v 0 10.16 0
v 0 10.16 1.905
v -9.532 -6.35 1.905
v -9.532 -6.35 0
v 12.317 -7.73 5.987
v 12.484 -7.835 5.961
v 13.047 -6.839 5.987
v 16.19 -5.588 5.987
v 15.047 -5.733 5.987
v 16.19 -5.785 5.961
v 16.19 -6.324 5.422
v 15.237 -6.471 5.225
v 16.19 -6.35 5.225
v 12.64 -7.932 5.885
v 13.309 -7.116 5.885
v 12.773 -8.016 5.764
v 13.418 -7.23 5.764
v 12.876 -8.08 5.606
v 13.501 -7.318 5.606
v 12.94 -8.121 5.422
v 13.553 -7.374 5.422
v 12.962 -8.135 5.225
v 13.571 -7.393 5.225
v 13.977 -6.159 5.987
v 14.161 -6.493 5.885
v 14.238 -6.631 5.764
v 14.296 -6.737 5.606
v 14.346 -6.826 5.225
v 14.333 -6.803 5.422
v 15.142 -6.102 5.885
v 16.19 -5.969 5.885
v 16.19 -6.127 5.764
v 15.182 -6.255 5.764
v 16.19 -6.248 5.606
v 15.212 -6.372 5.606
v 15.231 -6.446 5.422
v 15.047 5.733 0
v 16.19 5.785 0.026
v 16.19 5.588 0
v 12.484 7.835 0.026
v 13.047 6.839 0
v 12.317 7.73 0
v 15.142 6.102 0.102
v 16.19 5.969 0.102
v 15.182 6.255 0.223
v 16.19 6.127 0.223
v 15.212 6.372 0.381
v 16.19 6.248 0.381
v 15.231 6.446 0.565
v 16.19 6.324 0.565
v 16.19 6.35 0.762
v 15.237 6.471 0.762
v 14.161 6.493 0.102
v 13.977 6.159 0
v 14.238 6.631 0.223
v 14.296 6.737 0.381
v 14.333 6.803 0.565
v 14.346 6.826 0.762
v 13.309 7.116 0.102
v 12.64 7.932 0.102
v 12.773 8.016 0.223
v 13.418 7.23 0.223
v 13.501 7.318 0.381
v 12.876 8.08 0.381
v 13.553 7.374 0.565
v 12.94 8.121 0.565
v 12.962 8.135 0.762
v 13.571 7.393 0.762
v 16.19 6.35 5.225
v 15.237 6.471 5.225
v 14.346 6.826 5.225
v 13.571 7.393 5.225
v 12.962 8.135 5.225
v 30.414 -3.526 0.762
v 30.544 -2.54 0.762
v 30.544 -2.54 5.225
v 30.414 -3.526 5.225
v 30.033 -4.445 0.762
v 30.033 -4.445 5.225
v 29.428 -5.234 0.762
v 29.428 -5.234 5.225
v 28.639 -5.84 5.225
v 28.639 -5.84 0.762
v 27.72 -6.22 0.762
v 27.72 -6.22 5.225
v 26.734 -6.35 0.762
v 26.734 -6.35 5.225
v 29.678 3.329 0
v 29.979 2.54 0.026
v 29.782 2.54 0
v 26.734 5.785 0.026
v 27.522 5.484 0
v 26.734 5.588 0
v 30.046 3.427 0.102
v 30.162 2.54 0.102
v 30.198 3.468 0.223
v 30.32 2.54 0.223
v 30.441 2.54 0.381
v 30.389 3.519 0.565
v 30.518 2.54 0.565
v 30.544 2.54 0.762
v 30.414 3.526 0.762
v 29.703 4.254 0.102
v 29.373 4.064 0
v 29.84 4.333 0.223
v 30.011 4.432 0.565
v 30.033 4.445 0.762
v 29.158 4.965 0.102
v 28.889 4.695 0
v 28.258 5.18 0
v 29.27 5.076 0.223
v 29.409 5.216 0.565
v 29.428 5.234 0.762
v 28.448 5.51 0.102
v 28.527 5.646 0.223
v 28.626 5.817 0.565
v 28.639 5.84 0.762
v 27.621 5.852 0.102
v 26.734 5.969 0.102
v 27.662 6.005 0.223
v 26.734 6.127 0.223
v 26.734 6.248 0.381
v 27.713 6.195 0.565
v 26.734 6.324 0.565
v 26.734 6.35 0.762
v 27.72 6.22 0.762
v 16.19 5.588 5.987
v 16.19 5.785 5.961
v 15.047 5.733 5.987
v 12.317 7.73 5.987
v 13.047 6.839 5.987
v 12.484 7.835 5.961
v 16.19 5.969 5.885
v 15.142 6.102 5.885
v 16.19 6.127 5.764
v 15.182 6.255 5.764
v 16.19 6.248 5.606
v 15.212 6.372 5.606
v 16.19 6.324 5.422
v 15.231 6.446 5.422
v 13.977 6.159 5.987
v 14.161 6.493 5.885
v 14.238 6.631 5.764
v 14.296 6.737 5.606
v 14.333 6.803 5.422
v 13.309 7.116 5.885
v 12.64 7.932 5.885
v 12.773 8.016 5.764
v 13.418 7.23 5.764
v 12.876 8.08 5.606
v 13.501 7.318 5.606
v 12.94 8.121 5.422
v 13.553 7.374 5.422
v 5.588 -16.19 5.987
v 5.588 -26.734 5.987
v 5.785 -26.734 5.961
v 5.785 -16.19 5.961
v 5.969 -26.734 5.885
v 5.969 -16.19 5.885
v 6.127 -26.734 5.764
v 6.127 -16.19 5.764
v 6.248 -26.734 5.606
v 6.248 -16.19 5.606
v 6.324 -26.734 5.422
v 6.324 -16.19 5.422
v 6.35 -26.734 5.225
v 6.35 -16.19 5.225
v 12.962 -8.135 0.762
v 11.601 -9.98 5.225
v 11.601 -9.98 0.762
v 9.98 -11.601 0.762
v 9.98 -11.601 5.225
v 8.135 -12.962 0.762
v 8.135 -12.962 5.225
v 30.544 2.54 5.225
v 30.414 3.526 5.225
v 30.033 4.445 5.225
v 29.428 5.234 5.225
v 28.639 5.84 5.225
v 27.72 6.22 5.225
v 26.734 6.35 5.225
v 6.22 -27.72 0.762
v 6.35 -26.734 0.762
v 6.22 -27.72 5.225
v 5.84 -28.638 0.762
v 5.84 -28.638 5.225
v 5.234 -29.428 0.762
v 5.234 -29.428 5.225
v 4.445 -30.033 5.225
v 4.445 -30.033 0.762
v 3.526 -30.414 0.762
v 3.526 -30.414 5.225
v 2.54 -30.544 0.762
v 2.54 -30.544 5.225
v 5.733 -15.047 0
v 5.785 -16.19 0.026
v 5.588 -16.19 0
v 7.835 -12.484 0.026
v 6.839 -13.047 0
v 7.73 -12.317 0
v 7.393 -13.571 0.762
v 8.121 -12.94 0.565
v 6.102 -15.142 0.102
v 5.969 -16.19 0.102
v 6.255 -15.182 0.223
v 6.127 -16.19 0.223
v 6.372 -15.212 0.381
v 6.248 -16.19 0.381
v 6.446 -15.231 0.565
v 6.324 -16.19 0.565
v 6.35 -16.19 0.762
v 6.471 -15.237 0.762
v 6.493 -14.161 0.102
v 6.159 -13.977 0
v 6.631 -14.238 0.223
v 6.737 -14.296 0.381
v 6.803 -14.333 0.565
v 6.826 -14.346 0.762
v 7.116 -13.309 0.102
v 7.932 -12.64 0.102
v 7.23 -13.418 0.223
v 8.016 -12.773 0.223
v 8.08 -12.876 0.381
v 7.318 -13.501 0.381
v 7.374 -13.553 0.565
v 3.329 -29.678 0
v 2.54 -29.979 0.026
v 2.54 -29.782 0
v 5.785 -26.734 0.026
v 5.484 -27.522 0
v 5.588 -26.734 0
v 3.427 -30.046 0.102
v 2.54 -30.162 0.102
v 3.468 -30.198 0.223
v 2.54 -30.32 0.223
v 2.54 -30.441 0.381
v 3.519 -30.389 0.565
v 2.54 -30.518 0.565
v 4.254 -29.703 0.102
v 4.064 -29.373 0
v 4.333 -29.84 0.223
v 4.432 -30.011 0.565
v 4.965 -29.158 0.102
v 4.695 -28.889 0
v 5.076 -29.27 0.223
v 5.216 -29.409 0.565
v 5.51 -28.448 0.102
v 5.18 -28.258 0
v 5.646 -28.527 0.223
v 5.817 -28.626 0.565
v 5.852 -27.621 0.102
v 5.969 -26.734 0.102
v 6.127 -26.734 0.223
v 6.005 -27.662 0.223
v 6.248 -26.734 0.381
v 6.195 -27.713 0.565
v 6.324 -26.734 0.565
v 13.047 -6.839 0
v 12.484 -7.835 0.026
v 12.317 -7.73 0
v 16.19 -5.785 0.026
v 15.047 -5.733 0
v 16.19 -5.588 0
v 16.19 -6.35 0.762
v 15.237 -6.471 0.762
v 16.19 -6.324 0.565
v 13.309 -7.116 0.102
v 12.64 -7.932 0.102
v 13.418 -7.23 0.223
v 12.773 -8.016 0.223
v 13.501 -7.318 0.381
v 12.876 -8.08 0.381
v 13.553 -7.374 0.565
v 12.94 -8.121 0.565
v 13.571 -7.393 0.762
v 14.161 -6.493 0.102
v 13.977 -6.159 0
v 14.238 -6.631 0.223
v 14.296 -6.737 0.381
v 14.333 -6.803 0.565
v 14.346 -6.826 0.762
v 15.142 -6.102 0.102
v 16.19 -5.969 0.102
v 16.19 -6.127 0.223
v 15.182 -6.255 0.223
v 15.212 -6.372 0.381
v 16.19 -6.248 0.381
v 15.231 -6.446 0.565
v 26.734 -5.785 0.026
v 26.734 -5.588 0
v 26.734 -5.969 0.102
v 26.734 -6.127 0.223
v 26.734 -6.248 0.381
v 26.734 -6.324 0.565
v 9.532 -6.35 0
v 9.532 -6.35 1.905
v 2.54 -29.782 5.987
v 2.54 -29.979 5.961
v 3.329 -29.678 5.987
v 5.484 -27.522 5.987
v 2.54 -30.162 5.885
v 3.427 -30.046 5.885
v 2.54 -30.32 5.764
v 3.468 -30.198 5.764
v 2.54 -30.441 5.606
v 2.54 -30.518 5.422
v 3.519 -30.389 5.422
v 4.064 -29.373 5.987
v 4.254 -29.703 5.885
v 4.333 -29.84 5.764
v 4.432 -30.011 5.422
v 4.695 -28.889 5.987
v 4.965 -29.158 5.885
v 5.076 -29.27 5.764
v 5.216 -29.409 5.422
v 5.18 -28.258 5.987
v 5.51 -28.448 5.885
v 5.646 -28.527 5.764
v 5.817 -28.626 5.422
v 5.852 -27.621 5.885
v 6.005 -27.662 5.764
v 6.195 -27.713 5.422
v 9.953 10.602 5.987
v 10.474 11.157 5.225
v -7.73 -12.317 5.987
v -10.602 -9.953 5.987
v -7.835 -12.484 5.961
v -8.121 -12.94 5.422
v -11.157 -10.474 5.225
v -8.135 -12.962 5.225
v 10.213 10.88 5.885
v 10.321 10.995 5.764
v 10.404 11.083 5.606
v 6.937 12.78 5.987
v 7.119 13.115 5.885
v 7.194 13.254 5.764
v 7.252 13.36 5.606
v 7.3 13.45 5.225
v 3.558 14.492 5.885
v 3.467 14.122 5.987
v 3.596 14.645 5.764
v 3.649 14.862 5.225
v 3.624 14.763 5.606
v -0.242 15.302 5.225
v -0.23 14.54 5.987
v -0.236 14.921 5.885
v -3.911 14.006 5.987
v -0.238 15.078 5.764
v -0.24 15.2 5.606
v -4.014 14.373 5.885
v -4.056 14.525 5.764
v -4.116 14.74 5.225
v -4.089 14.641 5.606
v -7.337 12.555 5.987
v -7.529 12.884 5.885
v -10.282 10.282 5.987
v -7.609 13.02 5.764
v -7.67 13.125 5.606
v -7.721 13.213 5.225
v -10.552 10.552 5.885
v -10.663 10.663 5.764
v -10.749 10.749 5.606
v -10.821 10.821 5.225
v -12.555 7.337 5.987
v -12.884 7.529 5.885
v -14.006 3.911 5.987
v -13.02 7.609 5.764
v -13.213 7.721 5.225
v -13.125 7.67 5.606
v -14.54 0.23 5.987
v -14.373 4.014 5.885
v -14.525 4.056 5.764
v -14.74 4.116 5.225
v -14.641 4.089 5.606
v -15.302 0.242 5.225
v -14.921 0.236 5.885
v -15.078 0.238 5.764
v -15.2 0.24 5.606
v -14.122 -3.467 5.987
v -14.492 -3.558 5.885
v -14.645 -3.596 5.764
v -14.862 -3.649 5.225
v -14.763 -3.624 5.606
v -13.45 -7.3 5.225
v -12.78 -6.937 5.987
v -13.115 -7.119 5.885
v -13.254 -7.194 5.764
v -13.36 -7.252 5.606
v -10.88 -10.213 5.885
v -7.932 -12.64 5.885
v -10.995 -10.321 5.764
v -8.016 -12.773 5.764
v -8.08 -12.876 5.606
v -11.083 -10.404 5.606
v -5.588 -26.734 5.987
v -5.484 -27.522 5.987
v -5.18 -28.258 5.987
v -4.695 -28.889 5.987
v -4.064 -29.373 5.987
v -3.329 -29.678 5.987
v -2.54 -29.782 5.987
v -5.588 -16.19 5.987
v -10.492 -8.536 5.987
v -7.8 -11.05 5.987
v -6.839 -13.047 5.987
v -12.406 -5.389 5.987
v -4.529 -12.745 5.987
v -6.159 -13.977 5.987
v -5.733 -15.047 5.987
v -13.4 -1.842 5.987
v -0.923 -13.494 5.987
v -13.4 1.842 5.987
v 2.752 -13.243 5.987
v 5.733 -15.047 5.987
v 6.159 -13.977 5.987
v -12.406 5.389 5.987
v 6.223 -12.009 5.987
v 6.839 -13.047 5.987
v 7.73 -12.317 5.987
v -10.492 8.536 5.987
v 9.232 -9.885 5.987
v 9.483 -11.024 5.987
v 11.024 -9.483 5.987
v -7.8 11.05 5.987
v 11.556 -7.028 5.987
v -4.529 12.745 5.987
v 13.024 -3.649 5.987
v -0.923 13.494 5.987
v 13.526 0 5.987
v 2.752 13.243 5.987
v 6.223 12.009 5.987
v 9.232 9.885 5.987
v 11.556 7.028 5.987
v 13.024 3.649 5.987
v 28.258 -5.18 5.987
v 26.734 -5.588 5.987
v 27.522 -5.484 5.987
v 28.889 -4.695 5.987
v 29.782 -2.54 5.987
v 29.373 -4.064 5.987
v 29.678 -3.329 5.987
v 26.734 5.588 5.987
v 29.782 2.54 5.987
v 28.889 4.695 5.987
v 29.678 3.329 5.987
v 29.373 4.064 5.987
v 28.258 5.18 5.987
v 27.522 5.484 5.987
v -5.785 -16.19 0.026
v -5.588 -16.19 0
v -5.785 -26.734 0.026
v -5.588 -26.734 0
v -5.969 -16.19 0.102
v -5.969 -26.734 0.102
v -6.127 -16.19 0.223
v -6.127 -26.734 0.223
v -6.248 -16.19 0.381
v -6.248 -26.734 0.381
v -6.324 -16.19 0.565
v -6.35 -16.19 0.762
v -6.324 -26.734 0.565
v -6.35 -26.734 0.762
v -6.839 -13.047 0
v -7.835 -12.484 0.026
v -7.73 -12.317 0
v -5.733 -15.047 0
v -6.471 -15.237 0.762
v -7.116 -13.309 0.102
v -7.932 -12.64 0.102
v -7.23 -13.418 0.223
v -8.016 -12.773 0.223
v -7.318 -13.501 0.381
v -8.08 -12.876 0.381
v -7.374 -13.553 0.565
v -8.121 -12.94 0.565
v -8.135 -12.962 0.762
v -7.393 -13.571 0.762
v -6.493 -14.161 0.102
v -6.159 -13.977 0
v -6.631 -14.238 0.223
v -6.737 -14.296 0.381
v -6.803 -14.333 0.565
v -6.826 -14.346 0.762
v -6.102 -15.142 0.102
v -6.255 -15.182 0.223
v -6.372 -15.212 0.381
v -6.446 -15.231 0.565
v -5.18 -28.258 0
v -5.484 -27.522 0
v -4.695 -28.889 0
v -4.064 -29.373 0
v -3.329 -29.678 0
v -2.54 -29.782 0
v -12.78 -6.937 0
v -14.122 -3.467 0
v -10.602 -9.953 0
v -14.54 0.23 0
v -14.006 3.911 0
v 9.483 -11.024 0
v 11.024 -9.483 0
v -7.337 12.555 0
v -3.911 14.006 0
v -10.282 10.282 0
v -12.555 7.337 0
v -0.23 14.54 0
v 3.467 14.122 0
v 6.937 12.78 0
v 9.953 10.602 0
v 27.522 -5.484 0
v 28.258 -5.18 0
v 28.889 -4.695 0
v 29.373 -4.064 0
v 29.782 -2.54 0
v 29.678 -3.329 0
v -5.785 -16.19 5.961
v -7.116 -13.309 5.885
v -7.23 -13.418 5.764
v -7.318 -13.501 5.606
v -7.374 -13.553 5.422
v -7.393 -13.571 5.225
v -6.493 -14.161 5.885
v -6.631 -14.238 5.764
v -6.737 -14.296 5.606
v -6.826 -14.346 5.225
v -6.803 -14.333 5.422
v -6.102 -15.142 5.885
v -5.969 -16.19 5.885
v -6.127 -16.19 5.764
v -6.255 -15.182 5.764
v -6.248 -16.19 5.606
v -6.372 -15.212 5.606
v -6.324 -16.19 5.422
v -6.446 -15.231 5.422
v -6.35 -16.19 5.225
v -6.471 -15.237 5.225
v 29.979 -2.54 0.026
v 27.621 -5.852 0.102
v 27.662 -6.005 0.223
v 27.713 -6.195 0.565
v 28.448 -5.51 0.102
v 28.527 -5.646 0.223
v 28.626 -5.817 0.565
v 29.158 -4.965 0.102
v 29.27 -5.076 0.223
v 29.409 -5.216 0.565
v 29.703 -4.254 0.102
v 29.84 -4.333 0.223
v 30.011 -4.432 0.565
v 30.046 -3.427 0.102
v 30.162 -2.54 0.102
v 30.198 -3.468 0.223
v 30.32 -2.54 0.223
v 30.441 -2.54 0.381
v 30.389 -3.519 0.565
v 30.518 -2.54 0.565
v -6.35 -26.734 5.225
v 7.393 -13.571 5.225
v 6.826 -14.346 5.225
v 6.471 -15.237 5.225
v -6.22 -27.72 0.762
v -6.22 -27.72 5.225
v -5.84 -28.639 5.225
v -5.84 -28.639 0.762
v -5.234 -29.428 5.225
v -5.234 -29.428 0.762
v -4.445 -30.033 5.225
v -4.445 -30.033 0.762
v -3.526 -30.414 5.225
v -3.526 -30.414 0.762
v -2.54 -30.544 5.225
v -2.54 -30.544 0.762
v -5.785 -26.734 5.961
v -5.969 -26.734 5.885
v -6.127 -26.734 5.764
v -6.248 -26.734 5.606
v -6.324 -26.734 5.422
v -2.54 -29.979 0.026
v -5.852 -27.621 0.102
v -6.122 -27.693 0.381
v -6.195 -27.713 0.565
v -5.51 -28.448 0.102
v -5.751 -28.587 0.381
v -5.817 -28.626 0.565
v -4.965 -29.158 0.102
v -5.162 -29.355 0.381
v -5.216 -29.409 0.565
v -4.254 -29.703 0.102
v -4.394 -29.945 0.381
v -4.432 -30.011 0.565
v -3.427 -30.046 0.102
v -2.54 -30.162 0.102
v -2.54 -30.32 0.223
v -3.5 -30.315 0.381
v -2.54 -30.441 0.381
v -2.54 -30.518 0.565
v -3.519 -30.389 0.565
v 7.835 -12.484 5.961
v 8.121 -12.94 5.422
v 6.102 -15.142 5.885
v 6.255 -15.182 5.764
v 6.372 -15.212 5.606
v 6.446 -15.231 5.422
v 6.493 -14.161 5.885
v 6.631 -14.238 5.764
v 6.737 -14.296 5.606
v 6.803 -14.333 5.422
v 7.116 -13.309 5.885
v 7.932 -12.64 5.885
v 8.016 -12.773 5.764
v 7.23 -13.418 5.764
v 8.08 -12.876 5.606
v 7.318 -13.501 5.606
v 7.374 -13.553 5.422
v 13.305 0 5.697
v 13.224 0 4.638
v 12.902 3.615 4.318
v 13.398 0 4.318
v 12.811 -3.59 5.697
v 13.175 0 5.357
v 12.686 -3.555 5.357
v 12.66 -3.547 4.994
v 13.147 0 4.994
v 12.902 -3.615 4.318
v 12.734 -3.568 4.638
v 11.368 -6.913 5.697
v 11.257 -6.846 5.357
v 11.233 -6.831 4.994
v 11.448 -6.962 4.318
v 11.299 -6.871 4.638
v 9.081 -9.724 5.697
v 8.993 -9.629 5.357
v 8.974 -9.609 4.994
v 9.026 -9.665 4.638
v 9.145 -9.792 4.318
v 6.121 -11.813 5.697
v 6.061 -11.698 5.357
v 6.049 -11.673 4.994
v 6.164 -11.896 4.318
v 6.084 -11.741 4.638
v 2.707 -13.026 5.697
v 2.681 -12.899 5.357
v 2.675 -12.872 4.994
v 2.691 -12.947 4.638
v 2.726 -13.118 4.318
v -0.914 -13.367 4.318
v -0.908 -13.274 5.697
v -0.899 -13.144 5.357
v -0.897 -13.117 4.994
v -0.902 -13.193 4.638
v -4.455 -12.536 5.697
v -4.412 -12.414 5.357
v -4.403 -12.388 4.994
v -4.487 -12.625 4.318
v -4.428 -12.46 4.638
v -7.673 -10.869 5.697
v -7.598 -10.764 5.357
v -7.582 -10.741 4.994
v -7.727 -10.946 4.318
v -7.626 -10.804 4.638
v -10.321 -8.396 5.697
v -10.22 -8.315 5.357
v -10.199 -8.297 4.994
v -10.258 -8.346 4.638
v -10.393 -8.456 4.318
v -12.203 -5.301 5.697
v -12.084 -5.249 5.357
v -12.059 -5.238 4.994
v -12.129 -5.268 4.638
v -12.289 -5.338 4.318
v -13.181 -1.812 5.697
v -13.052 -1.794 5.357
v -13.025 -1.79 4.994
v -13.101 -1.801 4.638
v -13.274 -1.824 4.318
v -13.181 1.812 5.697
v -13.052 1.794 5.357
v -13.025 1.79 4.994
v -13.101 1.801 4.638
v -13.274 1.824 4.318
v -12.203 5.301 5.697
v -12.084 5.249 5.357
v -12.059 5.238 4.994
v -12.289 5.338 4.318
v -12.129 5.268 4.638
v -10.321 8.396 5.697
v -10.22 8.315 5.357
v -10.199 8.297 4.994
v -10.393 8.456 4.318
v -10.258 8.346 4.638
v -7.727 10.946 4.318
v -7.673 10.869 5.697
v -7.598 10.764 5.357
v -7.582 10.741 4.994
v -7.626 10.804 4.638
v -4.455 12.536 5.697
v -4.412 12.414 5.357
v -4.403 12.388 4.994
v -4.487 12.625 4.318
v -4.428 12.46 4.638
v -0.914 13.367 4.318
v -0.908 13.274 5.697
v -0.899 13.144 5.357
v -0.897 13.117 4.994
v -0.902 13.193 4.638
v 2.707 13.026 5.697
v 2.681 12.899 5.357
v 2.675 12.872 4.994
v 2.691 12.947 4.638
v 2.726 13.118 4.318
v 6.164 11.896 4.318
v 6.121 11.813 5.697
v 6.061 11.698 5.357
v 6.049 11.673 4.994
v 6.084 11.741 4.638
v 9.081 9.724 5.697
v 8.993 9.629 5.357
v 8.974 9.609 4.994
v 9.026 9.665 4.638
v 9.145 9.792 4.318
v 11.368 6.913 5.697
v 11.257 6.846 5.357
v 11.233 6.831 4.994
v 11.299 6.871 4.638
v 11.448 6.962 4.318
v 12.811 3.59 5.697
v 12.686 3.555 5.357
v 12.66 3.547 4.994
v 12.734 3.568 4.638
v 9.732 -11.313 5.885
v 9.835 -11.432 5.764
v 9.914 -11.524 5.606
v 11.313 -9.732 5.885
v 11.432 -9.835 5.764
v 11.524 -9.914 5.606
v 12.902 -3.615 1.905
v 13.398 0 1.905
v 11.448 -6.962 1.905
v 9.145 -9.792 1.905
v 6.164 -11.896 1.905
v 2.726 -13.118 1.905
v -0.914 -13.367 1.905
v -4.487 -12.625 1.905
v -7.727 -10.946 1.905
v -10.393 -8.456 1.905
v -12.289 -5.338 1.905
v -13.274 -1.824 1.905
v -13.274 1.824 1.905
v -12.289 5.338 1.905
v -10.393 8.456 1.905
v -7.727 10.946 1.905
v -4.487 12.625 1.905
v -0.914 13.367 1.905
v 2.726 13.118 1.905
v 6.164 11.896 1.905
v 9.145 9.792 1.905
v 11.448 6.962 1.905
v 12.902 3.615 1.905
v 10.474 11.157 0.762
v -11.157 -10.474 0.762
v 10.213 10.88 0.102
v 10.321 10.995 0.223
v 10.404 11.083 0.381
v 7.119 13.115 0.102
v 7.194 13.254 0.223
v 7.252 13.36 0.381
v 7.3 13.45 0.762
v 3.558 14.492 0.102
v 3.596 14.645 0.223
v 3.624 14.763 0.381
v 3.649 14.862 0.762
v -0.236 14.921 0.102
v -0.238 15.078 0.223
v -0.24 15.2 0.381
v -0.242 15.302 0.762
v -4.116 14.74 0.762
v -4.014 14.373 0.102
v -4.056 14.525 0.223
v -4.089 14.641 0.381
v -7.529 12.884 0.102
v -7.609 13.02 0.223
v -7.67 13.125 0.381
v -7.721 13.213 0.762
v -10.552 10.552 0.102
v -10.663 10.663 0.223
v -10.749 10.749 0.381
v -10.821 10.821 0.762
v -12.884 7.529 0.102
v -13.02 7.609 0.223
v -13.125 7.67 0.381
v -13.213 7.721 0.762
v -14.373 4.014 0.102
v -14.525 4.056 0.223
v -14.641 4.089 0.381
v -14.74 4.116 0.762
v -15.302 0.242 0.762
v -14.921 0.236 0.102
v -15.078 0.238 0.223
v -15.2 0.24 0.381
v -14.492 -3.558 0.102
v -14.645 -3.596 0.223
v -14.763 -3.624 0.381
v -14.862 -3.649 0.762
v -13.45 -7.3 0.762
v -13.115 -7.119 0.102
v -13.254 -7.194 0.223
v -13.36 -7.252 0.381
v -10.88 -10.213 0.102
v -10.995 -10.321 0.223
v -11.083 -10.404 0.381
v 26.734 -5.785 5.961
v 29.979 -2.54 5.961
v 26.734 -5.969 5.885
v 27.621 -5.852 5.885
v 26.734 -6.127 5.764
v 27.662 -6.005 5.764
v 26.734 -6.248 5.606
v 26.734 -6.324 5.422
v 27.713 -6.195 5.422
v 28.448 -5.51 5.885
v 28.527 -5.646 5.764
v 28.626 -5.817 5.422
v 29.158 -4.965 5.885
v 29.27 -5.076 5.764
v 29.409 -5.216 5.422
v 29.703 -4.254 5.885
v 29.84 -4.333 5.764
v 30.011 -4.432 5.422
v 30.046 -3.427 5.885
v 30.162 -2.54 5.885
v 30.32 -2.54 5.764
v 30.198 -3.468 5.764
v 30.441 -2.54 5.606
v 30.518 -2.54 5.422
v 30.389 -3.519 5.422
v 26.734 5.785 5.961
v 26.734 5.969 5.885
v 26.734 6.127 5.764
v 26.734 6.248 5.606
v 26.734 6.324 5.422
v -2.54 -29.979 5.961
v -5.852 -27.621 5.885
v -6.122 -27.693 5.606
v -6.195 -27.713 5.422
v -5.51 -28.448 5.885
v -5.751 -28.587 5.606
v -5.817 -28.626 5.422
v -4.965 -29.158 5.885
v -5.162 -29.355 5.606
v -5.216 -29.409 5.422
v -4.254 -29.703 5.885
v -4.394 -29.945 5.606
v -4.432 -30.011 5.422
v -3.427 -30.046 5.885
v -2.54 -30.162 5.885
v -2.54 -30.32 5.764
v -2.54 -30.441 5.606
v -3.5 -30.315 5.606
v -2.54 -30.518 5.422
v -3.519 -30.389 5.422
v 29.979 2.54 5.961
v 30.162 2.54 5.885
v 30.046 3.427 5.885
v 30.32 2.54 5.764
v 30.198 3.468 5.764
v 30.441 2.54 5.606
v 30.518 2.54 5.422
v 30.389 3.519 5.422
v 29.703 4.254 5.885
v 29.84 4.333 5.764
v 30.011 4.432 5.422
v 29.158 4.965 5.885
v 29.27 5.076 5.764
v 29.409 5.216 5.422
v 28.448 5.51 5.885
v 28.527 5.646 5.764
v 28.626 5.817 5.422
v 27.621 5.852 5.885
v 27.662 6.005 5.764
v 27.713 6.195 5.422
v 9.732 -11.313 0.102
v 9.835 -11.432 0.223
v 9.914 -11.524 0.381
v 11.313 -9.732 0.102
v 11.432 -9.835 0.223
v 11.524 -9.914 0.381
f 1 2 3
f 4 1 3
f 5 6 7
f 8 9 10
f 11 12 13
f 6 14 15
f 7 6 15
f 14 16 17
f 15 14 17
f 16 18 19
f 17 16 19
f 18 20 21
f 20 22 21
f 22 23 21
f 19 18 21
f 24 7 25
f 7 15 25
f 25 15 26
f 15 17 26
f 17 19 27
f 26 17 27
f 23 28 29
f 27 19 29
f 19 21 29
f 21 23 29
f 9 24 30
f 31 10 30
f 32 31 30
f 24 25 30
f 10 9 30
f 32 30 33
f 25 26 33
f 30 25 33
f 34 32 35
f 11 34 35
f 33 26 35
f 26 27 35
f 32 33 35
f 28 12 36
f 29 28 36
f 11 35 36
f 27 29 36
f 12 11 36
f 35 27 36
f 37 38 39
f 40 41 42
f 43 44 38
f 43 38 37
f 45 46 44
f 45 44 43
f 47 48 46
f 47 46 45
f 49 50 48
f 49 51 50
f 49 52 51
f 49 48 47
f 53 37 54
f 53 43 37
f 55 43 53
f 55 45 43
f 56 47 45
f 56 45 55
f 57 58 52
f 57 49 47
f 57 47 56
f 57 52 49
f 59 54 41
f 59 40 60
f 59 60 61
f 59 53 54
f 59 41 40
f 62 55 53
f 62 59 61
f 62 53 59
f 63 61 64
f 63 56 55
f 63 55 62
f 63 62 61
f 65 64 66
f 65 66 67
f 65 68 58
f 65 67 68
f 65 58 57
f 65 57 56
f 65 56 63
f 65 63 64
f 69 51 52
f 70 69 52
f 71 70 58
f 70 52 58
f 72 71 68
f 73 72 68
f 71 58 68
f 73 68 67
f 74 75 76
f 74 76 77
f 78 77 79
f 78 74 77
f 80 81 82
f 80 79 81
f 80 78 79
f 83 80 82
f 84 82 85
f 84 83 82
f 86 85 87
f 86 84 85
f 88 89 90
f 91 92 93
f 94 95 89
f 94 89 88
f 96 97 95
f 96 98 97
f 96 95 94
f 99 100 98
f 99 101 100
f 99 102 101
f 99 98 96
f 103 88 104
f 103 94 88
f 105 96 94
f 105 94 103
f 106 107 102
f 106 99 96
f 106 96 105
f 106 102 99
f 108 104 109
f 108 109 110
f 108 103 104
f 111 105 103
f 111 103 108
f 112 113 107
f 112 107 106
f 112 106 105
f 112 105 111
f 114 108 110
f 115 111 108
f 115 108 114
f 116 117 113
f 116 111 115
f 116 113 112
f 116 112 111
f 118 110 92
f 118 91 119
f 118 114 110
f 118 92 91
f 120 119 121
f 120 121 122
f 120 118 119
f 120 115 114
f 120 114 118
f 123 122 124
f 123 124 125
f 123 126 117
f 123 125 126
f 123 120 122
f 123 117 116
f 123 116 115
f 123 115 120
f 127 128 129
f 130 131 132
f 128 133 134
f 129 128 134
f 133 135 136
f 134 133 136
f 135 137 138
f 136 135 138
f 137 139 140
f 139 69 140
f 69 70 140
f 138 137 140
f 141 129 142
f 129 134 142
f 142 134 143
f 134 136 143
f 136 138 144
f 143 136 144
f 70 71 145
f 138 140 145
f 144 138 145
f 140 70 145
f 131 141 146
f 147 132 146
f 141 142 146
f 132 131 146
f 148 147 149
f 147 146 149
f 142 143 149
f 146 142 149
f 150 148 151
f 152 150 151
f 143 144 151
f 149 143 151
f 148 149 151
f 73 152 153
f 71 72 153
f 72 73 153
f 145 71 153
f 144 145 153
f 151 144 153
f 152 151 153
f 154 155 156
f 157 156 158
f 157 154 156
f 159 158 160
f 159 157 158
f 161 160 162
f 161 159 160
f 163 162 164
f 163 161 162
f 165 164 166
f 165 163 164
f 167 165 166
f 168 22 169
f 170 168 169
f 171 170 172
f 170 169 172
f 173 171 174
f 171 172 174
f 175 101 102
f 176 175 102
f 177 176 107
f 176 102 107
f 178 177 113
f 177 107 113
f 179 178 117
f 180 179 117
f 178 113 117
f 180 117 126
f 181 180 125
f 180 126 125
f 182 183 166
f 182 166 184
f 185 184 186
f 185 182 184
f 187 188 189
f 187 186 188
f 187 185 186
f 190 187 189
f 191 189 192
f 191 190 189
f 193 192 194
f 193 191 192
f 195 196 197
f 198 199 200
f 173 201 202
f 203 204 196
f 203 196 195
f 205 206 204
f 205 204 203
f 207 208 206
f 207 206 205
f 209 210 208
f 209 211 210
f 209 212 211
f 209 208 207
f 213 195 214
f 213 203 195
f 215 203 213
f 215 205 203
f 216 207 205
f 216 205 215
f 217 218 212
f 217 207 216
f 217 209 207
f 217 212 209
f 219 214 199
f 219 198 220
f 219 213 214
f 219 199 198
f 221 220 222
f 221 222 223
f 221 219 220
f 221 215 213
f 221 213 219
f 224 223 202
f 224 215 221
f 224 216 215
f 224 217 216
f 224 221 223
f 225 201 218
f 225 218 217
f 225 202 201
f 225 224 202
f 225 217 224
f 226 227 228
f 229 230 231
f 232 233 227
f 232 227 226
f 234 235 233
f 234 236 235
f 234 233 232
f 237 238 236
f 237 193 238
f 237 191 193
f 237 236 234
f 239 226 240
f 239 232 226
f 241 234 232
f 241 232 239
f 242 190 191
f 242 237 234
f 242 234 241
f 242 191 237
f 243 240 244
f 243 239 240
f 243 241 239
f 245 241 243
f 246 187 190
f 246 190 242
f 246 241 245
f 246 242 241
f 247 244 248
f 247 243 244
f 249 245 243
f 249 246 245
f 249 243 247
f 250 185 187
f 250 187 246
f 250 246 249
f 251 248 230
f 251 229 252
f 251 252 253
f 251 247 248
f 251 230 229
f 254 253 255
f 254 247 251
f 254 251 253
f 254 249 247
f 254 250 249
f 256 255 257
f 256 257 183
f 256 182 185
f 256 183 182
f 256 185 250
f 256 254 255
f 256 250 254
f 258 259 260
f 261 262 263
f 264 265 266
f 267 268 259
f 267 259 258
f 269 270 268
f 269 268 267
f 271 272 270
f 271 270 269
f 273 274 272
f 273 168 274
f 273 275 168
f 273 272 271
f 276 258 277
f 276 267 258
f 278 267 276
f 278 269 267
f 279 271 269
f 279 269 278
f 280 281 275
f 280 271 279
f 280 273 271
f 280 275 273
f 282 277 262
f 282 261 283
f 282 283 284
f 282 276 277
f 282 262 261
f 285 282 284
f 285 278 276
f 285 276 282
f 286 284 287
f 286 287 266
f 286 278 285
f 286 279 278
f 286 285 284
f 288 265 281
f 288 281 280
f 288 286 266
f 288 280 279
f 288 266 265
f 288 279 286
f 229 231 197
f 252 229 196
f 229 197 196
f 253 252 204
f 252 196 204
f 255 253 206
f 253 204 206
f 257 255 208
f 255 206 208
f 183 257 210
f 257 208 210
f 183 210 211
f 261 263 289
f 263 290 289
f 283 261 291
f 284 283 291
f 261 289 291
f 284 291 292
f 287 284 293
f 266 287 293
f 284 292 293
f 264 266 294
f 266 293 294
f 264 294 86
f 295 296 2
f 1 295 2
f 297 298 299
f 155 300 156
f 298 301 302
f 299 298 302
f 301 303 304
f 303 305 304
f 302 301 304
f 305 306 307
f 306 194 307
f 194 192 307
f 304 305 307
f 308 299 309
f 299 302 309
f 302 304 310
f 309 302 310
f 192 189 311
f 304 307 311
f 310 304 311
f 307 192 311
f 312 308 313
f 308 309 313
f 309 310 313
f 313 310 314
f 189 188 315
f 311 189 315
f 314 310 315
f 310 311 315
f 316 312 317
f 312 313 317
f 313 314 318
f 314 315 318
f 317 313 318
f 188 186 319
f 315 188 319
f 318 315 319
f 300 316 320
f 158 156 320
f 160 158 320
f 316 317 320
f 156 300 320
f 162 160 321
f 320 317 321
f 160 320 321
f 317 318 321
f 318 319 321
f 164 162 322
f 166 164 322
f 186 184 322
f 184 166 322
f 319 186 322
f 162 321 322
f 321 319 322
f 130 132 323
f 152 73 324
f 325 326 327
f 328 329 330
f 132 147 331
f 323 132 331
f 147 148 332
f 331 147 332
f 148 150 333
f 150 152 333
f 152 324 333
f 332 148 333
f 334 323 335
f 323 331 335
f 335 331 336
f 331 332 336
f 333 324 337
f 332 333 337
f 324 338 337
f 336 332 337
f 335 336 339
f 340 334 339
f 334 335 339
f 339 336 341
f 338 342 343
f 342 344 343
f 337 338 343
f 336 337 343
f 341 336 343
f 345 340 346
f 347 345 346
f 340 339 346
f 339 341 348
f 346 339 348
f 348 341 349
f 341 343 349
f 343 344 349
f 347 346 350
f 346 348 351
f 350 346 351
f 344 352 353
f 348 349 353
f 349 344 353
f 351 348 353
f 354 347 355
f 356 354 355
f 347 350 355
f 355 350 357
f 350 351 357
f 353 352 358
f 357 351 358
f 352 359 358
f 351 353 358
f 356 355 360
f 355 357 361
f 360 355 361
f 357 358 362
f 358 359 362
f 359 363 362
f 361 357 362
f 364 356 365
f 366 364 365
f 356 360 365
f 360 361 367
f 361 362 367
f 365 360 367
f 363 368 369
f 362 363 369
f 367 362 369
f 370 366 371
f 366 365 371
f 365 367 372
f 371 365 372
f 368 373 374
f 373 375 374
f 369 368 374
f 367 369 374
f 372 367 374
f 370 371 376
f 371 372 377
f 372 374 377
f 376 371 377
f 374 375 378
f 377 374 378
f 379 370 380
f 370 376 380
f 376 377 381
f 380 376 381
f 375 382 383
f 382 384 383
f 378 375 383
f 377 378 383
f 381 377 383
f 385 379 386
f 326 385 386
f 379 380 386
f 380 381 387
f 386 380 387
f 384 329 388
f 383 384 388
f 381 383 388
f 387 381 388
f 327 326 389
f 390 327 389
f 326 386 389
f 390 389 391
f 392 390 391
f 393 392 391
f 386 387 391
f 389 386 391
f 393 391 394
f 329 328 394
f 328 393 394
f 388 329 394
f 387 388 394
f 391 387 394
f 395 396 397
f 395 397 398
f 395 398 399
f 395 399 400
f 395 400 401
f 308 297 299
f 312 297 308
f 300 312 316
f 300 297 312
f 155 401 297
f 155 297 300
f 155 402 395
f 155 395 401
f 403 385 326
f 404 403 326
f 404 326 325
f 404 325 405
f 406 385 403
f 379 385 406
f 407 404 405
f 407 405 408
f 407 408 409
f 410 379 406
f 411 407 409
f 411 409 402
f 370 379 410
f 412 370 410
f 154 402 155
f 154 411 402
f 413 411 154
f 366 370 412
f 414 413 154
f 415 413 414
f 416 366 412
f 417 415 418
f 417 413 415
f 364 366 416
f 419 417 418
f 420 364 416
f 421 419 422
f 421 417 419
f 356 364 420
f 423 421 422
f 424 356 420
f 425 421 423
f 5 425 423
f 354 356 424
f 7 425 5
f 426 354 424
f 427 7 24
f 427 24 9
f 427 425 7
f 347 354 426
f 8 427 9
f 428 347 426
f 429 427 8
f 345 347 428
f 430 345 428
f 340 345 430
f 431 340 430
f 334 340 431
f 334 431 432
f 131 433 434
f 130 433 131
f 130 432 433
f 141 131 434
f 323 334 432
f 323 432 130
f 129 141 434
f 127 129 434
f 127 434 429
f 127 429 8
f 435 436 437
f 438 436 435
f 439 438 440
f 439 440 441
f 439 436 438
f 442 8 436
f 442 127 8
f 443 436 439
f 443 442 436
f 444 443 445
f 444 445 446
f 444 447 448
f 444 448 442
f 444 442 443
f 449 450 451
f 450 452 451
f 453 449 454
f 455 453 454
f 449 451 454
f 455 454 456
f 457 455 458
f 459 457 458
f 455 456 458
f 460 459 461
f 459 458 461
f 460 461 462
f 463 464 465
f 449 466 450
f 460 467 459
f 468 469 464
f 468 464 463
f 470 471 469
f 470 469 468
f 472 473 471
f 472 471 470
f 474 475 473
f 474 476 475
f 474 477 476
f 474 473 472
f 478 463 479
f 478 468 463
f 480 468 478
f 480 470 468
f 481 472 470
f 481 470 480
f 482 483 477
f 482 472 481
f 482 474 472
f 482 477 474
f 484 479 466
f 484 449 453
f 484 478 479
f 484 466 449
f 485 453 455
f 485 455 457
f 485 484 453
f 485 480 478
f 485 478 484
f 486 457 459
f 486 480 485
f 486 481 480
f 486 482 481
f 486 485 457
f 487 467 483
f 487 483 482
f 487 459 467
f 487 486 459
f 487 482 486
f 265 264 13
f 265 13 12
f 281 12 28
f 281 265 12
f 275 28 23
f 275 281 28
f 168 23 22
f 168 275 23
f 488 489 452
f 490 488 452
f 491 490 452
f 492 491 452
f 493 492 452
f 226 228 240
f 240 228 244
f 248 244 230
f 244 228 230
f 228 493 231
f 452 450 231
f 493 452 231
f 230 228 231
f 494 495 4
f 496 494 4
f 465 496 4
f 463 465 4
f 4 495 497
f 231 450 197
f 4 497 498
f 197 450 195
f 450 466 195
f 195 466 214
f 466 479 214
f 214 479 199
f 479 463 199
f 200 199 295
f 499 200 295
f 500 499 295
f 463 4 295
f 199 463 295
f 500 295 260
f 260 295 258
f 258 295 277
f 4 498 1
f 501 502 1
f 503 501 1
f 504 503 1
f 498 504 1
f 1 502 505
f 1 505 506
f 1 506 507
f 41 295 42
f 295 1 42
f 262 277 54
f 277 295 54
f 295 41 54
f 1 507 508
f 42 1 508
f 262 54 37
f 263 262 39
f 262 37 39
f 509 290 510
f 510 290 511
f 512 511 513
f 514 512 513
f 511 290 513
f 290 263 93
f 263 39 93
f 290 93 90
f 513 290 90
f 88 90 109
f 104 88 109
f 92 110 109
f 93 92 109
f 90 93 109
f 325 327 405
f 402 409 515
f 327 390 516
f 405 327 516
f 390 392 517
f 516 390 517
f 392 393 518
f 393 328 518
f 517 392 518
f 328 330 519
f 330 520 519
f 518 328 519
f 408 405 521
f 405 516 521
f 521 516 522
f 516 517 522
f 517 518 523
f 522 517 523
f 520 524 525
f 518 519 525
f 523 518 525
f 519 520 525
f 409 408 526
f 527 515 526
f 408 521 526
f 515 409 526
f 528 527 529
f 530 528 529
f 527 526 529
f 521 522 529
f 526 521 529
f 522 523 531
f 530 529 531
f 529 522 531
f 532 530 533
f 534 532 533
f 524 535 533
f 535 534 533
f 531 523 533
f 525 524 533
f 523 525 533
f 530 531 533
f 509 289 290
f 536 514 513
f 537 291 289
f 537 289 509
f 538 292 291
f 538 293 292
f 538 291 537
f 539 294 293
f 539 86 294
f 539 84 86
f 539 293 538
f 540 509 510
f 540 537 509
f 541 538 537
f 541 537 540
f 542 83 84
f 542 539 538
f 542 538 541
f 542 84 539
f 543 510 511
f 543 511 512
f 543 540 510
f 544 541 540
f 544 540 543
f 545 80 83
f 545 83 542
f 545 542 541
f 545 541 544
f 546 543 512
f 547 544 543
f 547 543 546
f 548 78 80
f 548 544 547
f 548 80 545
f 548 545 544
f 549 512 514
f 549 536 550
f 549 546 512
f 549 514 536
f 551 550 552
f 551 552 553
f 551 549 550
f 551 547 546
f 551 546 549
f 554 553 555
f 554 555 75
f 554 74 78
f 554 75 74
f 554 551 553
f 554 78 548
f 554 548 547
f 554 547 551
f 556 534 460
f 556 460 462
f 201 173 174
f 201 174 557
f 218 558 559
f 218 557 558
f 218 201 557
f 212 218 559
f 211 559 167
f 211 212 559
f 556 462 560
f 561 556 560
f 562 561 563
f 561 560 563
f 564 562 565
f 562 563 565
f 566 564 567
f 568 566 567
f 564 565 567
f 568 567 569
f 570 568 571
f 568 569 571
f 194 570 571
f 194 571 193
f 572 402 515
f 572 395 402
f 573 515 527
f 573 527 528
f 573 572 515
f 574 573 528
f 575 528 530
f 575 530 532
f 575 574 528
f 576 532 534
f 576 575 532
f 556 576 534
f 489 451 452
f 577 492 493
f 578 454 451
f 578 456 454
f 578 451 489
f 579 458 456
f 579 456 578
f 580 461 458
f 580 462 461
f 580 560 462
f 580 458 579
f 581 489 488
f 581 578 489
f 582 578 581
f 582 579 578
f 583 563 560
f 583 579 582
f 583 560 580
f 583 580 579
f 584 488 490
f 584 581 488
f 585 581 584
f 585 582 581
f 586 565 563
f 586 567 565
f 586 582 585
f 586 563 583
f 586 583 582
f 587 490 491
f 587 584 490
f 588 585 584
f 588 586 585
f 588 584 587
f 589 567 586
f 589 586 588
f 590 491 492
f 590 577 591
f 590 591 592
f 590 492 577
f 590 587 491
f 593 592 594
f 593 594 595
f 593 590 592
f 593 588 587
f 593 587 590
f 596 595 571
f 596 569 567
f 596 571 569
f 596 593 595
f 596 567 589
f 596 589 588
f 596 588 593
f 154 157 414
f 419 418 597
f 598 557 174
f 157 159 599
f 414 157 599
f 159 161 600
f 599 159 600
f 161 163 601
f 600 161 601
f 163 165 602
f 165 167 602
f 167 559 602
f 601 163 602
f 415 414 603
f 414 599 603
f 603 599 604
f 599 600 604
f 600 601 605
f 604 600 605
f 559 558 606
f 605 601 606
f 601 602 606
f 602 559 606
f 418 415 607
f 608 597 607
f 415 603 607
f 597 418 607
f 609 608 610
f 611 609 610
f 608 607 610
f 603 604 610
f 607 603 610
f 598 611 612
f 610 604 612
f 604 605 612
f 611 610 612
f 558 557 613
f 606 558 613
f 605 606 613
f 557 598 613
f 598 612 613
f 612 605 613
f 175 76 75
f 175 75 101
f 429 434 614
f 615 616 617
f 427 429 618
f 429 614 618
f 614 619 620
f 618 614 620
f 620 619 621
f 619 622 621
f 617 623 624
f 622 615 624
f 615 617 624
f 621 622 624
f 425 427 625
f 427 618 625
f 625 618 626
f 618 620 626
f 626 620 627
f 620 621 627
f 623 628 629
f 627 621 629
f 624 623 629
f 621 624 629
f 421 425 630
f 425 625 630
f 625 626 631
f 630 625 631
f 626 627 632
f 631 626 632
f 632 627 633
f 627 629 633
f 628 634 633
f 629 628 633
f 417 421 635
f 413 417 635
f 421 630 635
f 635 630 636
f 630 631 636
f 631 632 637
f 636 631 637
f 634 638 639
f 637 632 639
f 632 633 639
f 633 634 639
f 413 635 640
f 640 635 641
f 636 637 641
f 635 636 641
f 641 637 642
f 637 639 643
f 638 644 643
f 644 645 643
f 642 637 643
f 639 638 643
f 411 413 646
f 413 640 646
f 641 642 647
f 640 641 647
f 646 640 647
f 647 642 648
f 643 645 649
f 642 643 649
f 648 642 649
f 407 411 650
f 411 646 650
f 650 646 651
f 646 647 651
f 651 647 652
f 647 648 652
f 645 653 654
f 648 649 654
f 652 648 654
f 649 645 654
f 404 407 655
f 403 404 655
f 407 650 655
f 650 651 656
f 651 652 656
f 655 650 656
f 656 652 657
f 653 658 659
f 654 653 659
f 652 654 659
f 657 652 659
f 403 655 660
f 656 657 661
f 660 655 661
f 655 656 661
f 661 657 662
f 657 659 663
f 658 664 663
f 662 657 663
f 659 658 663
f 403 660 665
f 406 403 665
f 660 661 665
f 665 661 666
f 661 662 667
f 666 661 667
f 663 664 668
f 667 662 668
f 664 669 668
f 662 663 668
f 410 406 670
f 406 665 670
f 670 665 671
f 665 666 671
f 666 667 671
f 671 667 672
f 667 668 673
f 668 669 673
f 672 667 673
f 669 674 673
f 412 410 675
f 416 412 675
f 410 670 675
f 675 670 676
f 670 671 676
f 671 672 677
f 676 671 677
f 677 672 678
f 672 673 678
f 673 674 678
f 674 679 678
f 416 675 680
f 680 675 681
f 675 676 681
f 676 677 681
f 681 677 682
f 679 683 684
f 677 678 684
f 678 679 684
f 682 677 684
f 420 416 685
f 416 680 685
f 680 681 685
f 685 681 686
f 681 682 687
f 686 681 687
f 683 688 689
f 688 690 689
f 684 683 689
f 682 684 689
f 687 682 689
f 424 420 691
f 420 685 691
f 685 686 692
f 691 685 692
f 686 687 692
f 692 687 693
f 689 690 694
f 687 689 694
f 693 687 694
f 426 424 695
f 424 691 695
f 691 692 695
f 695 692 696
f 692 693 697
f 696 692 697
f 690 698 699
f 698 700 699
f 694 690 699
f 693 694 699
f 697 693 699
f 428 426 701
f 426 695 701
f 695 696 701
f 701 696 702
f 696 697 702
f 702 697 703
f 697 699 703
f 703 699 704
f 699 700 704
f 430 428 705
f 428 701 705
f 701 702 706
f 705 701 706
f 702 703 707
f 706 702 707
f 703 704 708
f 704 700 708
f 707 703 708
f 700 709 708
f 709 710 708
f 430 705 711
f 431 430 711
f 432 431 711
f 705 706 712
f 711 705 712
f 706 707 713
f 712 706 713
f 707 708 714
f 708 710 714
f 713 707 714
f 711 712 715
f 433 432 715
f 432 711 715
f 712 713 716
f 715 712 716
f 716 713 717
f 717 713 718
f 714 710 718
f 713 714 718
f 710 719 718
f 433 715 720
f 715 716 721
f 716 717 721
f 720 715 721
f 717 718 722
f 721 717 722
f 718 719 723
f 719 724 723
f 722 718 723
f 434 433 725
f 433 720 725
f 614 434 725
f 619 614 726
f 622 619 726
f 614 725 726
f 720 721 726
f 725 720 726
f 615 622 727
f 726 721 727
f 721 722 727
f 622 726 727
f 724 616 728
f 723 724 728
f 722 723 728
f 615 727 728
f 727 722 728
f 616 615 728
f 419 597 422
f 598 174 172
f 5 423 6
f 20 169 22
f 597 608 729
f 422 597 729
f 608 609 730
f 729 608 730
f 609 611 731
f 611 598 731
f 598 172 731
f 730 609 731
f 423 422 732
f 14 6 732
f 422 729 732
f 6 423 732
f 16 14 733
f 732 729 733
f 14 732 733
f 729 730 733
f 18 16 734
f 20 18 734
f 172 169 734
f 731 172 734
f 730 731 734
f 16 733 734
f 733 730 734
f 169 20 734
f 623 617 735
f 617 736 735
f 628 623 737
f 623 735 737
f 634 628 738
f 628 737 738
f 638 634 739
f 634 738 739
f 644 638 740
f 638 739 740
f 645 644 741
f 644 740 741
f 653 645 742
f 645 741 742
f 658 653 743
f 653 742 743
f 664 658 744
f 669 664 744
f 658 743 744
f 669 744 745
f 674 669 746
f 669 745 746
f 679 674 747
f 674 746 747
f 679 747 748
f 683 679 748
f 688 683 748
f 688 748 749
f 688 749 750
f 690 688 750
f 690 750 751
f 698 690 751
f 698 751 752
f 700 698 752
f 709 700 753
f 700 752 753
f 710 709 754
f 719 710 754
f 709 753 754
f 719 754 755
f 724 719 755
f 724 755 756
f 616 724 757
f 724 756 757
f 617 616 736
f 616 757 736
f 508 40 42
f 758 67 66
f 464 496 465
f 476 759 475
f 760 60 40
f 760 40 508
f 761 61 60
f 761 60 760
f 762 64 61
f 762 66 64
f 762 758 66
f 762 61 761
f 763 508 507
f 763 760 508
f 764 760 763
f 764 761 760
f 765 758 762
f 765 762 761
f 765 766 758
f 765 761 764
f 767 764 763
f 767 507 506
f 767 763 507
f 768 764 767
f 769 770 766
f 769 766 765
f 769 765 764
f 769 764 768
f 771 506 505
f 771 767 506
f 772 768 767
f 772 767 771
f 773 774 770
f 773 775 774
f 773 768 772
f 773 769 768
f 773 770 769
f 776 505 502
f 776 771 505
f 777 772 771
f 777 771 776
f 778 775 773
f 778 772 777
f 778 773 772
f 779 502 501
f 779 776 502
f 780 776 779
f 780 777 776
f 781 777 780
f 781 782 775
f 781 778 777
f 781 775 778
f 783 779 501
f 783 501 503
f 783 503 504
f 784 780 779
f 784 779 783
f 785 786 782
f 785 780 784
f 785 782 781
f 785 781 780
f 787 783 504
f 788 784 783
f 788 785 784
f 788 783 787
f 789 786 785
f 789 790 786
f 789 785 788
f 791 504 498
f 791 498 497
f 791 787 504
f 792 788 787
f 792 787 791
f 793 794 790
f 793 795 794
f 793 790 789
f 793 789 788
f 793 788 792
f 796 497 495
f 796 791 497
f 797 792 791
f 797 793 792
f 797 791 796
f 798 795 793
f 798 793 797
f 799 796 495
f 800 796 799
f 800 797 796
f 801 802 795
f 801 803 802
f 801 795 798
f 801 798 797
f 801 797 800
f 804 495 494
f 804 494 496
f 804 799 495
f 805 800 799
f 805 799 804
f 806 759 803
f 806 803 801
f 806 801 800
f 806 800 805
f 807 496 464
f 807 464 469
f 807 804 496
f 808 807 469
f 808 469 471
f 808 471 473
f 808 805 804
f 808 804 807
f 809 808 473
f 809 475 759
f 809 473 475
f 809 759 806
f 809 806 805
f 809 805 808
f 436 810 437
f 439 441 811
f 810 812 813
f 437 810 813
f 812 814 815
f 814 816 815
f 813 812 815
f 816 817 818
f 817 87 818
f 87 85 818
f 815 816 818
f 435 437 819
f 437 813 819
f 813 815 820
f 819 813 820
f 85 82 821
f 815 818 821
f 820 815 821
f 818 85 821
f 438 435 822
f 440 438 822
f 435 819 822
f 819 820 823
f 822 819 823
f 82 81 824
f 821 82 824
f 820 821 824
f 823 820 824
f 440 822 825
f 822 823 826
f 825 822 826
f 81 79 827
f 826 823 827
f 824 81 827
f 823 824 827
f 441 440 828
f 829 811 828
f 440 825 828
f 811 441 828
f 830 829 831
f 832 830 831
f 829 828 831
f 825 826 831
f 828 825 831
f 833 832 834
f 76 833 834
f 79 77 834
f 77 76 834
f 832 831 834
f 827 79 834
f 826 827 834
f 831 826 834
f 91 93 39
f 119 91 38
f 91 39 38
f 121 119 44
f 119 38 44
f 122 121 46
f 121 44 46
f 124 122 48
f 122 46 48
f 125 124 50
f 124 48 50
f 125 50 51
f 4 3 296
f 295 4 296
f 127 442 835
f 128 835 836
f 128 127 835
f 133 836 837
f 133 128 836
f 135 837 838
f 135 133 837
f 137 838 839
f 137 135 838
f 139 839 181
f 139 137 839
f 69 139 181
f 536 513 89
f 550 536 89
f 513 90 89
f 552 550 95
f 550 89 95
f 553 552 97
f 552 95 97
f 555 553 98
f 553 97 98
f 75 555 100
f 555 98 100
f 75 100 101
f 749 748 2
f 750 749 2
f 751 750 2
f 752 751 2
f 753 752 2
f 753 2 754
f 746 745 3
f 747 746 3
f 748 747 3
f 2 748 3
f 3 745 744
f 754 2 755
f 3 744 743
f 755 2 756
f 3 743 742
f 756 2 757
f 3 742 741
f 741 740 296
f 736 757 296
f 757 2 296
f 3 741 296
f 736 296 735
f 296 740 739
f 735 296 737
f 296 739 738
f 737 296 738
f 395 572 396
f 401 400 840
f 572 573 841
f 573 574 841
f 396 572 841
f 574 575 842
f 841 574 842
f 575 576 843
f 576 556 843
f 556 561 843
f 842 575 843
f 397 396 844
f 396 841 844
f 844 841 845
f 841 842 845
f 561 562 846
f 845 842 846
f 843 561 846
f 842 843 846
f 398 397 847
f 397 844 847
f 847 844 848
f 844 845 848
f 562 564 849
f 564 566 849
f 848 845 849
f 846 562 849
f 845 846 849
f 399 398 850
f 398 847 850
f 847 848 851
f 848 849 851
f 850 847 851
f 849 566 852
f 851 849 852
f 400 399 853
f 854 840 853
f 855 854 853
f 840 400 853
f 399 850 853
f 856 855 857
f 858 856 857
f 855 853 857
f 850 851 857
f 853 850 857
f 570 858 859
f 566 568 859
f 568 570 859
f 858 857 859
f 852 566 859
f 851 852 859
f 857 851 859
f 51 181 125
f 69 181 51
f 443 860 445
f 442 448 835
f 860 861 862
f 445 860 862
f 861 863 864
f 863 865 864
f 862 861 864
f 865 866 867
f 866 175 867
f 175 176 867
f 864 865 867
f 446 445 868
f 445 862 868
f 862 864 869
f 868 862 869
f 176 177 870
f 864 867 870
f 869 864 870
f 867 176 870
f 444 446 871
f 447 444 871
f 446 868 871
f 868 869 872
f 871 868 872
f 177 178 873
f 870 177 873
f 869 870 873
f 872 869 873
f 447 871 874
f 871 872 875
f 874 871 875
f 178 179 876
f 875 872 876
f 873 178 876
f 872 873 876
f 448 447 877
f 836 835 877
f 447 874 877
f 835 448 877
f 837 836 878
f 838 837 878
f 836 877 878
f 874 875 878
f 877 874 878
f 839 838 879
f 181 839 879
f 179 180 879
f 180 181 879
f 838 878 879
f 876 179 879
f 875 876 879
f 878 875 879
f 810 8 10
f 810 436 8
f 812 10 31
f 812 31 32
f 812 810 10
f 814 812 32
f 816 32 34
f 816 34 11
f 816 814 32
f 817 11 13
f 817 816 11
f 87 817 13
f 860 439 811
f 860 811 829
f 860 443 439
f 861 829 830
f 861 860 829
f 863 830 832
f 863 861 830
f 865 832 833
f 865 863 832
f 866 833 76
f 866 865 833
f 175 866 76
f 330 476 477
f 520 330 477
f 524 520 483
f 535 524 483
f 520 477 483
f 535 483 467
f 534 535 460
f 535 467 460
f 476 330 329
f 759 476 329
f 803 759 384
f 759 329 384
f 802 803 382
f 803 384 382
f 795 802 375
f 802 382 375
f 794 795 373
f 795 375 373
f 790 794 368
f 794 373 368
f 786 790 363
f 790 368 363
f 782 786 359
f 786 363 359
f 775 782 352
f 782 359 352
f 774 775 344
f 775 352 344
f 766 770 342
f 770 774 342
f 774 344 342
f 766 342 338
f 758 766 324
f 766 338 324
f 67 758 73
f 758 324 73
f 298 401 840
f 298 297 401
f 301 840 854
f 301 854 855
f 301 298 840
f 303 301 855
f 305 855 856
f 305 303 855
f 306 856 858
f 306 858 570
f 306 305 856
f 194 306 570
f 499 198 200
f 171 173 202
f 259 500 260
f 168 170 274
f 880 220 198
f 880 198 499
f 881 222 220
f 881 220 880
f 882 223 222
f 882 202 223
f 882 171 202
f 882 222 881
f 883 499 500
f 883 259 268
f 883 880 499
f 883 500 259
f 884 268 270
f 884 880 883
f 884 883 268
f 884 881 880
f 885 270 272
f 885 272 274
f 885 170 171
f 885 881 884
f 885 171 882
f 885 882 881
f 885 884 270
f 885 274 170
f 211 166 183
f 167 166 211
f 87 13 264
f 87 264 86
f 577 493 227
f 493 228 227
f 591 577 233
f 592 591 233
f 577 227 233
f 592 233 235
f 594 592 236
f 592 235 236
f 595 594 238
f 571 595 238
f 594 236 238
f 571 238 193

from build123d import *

# Parameters (mm, degrees)
F3_DEPTH = 5.9869614104
F4_R     = 3.81
F5_R     = 0.762
F7_DEPTH = 25.4


with BuildPart() as f1:
    # F0 (on Front) → F1 (revolve)
    with BuildSketch(Plane.XZ):
        with BuildLine():
            Line((15.3035, 0), (15.3035, 4.1730385896))
            ThreePointArc((15.3035, 4.1730385896), (14.3181376493, 3.8136610654), (13.3985, 4.318))
            Line((13.3985, 4.318), (13.3985, 1.905))
            Line((13.3985, 1.905), (0, 1.905))
            Line((0, 1.905), (0, 0))
            Line((0, 0), (15.3035, 0))
        make_face()
        with BuildLine():
            ThreePointArc((13.3985, 4.318), (14.3181376493, 3.8136610654), (15.3035, 4.1730385896))
            Line((15.3035, 4.1730385896), (15.3035, 5.9869614104))
            Line((15.3035, 5.9869614104), (13.5255, 5.9869614104))
            ThreePointArc((13.5255, 5.9869614104), (13.1481610654, 5.1763623507), (13.3985, 4.318))
        make_face()
    revolve(axis=Axis((0, 0, 4.2298094004), (0, 0, -1)))

    # F2 (on face) → F3 (join, through all)
    with BuildSketch(Plane.XY.offset(5.9869614104)):
        with BuildLine():
            Line((30.5435, -6.35), (30.5435, 6.35))
            Line((30.5435, 6.35), (13.9238863917, 6.35))
            ThreePointArc((13.9238863917, 6.35), (15.3035, 0), (13.9238863917, -6.35))
            Line((13.9238863917, -6.35), (30.5435, -6.35))
        make_face()
        with BuildLine():
            Line((-6.35, -30.5435), (6.35, -30.5435))
            Line((6.35, -30.5435), (6.35, -13.9238863917))
            ThreePointArc((6.35, -13.9238863917), (0, -15.3035), (-6.35, -13.9238863917))
            Line((-6.35, -13.9238863917), (-6.35, -30.5435))
        make_face()
    extrude(amount=-F3_DEPTH)

    # F4
    f4_edges = [f1.edges().sort_by_distance(p)[0] for p in [
        (-6.35, -30.5435, 2.993481),
        (-6.35, -13.923886, 2.993481),
        (6.35, -30.5435, 2.993481),
        (6.35, -13.923886, 2.993481),
        (13.923886, -6.35, 2.993481),
        (30.5435, -6.35, 2.993481),
        (30.5435, 6.35, 2.993481),
        (13.923886, 6.35, 2.993481),
    ]]
    fillet(f4_edges, radius=F4_R)

    # F5
    f5_edges = [f1.edges().sort_by_distance(p)[0] for p in [
        (0, -30.5435, 5.986961),
        (0, -30.5435, 0),
    ]]
    fillet(f5_edges, radius=F5_R)

    # F6 (on face) → F7 (cut)
    with BuildSketch(Plane.XY.offset(1.905)):
        Polygon((0, 10.16), (-9.5320529443, -6.35), (9.5320529443, -6.35), align=None)
    extrude(amount=-F7_DEPTH, mode=Mode.SUBTRACT)


solid = f1.part
